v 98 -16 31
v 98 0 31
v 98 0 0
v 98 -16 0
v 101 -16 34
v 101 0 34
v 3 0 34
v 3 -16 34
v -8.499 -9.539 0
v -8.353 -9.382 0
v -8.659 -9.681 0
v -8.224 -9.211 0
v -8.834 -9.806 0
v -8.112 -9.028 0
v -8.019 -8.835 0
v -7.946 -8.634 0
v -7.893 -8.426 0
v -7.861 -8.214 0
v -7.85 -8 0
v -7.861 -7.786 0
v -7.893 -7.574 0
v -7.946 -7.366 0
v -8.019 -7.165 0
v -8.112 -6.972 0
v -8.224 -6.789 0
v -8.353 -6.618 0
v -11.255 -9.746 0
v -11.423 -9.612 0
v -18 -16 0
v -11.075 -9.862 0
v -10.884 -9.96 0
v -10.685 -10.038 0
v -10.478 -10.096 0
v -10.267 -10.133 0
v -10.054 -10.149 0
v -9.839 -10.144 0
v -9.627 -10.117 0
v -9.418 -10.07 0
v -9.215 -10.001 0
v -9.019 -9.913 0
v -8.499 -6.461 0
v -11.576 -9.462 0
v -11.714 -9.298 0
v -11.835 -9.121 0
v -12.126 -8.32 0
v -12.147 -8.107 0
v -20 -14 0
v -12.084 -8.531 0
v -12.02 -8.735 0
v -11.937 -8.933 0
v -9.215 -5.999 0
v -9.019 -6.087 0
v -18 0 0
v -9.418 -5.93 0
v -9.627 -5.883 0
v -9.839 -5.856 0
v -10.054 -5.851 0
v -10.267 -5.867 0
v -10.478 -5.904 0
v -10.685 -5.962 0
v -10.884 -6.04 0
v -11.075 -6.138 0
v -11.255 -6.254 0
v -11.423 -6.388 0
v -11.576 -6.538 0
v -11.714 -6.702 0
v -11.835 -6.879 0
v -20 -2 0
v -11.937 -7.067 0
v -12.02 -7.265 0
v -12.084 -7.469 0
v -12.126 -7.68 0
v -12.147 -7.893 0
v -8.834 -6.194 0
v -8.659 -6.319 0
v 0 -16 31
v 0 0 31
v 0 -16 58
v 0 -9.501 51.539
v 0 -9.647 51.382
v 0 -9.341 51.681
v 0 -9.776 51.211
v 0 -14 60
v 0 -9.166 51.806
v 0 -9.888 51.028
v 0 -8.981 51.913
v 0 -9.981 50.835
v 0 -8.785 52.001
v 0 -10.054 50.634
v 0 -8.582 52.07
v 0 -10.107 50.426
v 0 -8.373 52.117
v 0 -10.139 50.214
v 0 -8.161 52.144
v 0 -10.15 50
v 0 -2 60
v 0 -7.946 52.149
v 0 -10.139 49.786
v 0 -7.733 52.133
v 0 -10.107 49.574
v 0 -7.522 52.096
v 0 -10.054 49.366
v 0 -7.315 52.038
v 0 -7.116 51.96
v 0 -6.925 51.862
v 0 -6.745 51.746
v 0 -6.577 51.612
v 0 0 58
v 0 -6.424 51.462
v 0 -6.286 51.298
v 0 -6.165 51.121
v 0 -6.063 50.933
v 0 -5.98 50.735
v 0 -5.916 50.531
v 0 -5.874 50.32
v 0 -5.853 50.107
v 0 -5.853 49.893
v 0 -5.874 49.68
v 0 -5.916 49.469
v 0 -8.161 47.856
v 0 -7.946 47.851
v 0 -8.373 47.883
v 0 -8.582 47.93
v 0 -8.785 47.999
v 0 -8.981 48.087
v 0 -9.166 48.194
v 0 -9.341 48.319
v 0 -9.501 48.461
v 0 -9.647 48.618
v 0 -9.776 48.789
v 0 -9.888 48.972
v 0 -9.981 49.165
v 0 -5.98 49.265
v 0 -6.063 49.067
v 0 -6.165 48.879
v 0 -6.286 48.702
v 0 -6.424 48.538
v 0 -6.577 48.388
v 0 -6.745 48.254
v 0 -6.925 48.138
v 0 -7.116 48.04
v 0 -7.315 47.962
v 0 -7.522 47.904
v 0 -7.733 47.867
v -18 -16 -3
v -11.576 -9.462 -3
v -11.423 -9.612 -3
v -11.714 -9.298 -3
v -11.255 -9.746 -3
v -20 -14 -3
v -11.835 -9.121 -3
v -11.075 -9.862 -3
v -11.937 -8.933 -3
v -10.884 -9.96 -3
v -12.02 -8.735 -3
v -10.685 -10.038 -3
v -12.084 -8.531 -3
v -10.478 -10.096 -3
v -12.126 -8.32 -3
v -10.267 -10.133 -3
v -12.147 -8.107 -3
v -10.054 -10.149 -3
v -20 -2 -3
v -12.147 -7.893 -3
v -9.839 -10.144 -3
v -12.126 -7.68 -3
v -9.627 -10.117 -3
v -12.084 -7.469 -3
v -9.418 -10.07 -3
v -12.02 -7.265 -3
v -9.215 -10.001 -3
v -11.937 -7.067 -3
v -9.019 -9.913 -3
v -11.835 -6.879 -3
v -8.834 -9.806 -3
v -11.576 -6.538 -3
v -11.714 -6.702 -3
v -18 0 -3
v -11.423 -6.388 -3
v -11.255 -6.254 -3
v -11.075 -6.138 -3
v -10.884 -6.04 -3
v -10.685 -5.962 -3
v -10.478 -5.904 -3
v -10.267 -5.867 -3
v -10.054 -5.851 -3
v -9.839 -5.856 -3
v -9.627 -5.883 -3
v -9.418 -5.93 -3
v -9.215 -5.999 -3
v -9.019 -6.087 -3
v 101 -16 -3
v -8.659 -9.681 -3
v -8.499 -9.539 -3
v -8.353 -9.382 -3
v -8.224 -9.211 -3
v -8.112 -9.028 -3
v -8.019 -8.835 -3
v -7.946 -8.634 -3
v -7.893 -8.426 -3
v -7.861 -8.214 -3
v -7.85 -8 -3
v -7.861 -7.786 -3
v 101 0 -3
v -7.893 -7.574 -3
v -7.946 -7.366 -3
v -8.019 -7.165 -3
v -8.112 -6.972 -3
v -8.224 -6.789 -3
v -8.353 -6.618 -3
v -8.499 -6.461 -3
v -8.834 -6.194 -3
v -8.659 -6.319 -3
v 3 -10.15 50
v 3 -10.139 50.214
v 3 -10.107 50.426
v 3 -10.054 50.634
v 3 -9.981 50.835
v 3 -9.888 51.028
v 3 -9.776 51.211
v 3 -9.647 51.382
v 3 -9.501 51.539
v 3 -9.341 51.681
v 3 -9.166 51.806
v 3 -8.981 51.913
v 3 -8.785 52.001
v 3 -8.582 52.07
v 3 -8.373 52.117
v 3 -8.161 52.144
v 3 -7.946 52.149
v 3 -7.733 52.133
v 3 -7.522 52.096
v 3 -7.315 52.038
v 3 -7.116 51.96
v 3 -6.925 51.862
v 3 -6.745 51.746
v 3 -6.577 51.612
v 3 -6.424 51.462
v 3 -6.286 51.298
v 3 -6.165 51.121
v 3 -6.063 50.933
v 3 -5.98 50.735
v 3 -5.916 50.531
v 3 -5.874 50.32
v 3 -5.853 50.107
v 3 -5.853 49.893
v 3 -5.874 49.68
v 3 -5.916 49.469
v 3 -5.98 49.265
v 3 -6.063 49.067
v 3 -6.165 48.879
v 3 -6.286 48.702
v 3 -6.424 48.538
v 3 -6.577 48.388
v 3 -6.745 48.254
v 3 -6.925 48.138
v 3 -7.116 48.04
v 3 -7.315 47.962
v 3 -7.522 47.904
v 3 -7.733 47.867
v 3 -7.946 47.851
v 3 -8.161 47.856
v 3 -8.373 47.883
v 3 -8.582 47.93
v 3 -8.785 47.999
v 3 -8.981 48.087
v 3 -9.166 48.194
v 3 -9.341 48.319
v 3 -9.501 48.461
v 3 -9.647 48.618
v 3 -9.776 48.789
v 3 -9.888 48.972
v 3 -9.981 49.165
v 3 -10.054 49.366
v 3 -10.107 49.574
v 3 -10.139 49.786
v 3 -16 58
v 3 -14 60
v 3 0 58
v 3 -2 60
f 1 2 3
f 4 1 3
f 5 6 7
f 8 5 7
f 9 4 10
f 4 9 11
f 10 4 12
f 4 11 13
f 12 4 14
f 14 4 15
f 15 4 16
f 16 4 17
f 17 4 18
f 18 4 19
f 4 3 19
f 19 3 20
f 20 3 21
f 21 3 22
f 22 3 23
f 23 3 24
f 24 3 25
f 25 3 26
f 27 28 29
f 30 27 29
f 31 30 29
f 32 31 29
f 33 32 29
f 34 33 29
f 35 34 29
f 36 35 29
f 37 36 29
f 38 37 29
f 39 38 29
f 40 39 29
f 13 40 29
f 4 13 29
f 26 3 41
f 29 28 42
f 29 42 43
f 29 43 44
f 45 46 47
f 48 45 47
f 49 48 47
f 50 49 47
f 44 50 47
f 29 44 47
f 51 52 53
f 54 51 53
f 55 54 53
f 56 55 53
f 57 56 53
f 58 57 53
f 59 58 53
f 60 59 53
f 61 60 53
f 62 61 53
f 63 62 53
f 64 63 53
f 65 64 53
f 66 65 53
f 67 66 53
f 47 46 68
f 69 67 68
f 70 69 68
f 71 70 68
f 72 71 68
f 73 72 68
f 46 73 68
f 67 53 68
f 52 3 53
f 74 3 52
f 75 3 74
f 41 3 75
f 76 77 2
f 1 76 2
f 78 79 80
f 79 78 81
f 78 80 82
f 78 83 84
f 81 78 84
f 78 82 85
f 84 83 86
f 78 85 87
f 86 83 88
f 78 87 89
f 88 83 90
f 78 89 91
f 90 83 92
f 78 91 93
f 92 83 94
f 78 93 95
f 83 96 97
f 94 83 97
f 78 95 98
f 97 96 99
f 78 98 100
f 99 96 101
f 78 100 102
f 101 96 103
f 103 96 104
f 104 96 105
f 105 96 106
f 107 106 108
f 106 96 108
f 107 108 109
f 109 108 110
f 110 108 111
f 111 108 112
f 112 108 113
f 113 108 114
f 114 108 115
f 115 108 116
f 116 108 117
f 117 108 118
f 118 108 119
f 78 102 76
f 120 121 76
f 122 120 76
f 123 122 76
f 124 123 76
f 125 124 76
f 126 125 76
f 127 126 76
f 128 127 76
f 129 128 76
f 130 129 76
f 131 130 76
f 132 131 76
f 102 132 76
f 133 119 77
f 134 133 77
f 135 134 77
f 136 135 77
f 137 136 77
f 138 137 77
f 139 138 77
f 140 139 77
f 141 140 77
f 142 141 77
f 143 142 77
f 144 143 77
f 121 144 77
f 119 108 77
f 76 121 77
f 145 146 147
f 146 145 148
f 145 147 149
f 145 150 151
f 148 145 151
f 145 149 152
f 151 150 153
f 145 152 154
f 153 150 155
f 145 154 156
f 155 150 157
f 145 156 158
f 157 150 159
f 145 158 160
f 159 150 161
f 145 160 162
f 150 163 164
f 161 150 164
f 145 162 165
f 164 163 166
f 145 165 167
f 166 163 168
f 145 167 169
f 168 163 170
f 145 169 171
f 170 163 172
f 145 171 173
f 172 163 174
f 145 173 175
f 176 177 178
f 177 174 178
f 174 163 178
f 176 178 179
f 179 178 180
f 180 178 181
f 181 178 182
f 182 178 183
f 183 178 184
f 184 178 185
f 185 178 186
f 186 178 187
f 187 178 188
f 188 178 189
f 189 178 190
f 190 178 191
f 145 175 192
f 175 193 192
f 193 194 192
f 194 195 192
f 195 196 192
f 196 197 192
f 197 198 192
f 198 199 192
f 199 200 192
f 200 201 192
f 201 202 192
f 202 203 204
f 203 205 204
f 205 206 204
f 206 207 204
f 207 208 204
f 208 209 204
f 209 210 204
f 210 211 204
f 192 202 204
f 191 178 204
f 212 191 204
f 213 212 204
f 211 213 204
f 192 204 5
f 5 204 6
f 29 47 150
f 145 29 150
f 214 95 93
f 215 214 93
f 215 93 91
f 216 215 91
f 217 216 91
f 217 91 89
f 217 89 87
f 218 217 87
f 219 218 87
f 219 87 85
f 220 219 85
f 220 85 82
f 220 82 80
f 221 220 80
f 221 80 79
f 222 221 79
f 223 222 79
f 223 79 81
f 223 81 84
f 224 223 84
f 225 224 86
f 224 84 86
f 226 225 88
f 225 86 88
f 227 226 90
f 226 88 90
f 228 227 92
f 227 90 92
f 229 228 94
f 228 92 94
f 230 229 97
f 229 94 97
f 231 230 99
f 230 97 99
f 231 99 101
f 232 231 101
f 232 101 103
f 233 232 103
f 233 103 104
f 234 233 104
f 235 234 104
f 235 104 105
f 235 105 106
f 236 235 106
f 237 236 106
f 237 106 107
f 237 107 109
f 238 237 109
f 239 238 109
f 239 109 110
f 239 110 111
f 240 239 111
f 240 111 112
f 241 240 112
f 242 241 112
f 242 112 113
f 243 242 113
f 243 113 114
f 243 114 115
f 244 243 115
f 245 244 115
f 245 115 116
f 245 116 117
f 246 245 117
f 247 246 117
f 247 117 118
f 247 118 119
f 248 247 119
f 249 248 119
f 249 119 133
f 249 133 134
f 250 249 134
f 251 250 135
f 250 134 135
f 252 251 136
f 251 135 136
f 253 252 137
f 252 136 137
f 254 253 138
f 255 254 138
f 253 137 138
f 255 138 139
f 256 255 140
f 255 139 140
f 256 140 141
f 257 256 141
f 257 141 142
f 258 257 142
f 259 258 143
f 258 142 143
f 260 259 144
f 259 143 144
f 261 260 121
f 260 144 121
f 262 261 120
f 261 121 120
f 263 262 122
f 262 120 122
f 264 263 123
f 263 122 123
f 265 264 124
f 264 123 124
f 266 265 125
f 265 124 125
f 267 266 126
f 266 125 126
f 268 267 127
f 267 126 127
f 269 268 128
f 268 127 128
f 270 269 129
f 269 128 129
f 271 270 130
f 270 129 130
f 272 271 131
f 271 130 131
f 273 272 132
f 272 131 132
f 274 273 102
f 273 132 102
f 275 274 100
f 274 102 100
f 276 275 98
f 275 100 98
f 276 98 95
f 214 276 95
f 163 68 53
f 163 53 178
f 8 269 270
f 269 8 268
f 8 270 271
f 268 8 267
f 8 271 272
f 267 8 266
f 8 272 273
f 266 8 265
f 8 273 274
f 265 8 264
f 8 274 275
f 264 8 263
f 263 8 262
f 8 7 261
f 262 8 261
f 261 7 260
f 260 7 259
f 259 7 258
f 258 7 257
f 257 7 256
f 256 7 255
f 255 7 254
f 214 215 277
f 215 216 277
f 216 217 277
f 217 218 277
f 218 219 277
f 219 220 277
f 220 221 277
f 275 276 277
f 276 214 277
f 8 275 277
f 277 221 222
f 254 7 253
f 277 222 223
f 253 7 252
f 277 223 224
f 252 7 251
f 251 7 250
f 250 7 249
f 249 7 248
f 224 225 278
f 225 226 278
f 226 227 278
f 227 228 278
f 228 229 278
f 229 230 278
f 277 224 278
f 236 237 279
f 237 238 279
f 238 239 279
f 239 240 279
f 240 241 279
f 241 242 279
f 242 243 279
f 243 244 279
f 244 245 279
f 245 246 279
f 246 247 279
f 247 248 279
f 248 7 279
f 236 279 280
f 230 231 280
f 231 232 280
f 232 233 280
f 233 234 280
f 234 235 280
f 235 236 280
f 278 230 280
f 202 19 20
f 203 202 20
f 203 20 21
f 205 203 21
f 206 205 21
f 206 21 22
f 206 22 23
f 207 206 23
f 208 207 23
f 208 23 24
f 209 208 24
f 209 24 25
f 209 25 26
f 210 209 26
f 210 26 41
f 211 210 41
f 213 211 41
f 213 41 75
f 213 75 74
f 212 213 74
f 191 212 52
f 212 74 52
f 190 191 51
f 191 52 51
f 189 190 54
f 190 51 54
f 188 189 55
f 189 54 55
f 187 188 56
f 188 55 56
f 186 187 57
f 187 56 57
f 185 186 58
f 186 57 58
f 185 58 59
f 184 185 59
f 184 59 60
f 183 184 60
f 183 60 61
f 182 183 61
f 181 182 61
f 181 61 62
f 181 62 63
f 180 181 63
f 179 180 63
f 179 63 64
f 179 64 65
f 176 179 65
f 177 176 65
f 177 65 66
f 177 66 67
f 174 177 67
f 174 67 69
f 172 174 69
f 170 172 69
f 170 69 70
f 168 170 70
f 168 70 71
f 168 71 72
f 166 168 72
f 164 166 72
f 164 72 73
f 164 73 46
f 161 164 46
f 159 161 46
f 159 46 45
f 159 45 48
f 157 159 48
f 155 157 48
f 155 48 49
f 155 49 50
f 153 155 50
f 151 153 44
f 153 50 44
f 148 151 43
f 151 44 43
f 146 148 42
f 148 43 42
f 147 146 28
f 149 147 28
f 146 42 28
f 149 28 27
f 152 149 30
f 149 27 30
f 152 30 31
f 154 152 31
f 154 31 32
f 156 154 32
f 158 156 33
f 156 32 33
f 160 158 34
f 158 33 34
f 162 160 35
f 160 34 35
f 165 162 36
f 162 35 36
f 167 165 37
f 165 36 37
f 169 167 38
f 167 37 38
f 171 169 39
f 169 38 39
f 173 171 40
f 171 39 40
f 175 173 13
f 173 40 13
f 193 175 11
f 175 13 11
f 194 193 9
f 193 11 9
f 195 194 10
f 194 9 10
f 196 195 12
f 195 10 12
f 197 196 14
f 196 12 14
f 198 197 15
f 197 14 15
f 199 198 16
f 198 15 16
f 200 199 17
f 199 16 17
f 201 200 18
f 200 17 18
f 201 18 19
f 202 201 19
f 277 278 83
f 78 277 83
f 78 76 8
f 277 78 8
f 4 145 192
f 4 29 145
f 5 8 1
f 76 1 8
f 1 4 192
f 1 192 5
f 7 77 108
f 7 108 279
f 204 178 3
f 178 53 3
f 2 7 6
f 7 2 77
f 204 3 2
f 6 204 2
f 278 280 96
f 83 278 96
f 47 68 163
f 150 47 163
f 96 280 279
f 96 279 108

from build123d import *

# Parameters (mm, degrees)
F1_DEPTH = 16
F2_R     = 2.15
F3_DEPTH = 25
F4_R     = 2.15
F5_DEPTH = 25
F6_SIZE  = 2


with BuildPart() as f1:
    # F0 (on Front) → F1 (new body)
    with BuildSketch(Plane.XZ):
        Polygon((98, 0), (0, 0), (-20, 0), (-20, -3), (0, -3), (101, -3), (101, 34), (3, 34), (3, 60), (0, 60), (0, 31), (98, 31), align=None)
    extrude(amount=F1_DEPTH)

    # F2 (on face) → F3 (cut)
    with BuildSketch(Plane.XY):
        with Locations((-10, -8)):
            Circle(F2_R)
    extrude(amount=-F3_DEPTH, mode=Mode.SUBTRACT)

    # F4 (on face) → F5 (cut)
    with BuildSketch(Plane(origin=(0, 0, 0), x_dir=(0, -1, 0), z_dir=(-1, 0, 0))):
        with Locations((8, 50)):
            Circle(F4_R)
    extrude(amount=-F5_DEPTH, mode=Mode.SUBTRACT)

    # F6
    f6_edges = [f1.edges().sort_by_distance(p)[0] for p in [
        (1.5, -16, 60),
        (1.5, 0, 60),
        (-20, -16, -1.5),
        (-20, 0, -1.5),
    ]]
    chamfer(f6_edges, length=F6_SIZE)


solid = f1.part
